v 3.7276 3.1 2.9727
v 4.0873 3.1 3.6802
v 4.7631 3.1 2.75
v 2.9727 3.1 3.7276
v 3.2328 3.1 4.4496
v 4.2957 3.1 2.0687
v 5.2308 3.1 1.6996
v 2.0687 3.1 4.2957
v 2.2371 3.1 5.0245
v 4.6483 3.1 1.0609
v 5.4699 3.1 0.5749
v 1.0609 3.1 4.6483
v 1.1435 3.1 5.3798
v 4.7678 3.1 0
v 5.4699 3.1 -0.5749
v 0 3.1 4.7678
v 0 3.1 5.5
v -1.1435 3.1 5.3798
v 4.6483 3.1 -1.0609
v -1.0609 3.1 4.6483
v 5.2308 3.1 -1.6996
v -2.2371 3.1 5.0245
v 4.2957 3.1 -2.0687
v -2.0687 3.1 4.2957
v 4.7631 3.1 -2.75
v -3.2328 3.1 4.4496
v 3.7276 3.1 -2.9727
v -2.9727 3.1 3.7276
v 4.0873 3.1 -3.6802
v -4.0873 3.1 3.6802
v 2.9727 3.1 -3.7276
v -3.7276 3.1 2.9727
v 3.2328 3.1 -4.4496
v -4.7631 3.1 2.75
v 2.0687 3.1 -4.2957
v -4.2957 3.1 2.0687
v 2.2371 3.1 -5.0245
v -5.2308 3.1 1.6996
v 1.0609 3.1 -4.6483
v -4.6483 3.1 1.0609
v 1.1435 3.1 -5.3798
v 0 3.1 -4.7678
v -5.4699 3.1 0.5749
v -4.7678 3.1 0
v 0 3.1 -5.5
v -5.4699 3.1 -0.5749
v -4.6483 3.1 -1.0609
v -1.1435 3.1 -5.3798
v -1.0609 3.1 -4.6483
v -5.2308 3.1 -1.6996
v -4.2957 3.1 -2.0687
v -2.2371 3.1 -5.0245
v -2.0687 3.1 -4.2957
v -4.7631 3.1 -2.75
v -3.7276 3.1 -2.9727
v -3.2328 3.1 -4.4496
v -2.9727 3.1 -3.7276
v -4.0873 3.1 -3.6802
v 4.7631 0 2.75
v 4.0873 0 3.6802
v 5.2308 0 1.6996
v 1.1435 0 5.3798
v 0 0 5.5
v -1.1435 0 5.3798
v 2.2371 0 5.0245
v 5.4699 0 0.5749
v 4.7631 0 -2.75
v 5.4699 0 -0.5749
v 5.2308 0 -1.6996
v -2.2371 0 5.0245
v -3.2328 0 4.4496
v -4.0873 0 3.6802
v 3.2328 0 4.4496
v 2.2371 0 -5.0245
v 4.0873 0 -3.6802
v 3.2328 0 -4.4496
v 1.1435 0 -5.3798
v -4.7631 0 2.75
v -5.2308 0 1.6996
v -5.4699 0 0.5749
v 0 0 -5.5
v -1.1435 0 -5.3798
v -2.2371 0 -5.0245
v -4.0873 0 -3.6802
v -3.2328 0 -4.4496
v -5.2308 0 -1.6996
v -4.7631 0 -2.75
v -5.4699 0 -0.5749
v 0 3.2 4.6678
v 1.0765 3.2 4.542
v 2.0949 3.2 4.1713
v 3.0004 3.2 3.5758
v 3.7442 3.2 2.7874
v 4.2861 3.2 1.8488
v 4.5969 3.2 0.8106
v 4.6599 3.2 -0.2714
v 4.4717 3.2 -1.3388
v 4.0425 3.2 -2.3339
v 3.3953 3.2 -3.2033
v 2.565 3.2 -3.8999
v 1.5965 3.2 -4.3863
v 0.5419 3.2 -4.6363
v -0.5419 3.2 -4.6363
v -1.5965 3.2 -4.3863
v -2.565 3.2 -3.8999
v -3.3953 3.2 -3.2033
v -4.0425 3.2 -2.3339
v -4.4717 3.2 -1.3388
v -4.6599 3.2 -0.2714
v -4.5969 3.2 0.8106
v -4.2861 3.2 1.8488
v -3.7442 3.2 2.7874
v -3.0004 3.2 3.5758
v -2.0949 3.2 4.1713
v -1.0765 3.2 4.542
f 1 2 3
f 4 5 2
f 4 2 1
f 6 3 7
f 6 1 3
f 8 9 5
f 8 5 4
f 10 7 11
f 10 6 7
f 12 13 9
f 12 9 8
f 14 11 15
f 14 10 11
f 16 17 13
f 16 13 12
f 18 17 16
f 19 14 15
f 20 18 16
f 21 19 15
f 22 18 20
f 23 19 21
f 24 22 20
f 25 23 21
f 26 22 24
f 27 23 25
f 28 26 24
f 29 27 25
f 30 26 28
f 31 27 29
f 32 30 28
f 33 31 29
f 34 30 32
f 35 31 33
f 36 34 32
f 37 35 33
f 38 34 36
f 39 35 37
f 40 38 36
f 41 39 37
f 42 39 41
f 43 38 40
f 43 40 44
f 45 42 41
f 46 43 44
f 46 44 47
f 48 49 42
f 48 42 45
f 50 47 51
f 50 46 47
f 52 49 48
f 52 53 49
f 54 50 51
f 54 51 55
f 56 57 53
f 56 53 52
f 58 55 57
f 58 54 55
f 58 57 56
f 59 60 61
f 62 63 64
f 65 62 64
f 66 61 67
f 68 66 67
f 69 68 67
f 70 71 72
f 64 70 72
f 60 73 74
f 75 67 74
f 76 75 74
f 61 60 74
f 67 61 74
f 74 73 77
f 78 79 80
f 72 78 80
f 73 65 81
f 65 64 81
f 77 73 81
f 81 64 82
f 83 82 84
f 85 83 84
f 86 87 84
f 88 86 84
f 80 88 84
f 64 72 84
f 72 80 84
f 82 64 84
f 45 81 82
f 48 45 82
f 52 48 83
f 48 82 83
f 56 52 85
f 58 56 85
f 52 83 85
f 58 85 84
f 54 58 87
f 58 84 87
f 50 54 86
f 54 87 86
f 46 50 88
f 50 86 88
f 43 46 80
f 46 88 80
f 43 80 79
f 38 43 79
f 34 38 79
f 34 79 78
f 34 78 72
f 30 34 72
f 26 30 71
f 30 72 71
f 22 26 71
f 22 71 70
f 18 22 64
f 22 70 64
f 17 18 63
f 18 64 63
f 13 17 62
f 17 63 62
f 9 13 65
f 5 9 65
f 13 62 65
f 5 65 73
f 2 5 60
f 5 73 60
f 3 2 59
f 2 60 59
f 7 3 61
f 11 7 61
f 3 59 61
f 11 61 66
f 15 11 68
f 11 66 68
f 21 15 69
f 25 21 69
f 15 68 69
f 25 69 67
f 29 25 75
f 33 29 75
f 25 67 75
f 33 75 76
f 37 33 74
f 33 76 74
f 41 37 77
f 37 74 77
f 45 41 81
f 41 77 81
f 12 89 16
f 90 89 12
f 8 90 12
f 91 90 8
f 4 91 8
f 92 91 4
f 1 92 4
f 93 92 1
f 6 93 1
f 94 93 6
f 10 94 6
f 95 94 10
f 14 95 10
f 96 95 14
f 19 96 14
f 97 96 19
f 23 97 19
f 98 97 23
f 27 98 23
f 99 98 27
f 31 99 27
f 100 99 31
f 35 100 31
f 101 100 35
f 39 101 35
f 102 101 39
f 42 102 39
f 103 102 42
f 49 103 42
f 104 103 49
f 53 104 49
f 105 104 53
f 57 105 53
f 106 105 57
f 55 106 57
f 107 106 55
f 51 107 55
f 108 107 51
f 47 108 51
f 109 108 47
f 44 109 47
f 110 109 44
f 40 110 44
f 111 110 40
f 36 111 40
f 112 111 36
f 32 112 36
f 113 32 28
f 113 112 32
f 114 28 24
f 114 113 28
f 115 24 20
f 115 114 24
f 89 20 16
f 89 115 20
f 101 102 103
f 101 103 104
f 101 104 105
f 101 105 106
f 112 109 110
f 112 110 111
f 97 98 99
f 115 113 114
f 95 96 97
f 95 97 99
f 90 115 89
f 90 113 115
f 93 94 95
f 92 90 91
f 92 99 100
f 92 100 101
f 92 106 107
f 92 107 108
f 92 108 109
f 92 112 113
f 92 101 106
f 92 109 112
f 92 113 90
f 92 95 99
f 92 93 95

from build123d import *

# Parameters (mm, degrees)
SKETCH1_R           = 5.5
BOSS_EXTRUDE1_DEPTH = 3.1
SKETCH2_R           = 5.167835257
BOSS_EXTRUDE2_DEPTH = 0.1
CHAMFER1_SIZE       = 0.5


with BuildPart() as part:
    # Sketch1 → Boss-Extrude1 (new body)
    with BuildSketch(Plane(origin=(0, 0, 0), x_dir=(1, 0, 0), z_dir=(0, 1, 0))):
        with Locations(Location((0, 0, 0), (0, 0, 90))):
            Circle(SKETCH1_R)
    extrude(amount=BOSS_EXTRUDE1_DEPTH)

    # Sketch2 → Boss-Extrude2 (add)
    with BuildSketch(Plane(origin=(0, 3.1, 0), x_dir=(1, 0, 0), z_dir=(0, 1, 0))):
        with Locations(Location((0, 0, 0), (0, 0, 270))):
            Circle(SKETCH2_R)
    extrude(amount=BOSS_EXTRUDE2_DEPTH)

    # Chamfer1
    # the kernel refuses this chamfer: 0.5 mm, written as the material it takes off along each edge
    with BuildSketch(Plane(origin=(0, 3.2, 0), x_dir=(0, 0, 1), z_dir=(-1, 0, 0))) as chamfer1_piece_1_section:
        Polygon((5.167835257, -CHAMFER1_SIZE), (5.167835257 - CHAMFER1_SIZE, 0), (5.167835257, 0), align=None)
    chamfer1_piece_1 = revolve(axis=Axis((0, 3.2, 0), (0, 1, 0)), mode=Mode.PRIVATE)
    chamfer1_piece_1 = split(chamfer1_piece_1, bisect_by=Plane(origin=(0, 3.1, -4.719067591), z_dir=(0, 1, 0)), keep=Keep.TOP, mode=Mode.PRIVATE)
    add(chamfer1_piece_1, mode=Mode.SUBTRACT)


solid = part.part
